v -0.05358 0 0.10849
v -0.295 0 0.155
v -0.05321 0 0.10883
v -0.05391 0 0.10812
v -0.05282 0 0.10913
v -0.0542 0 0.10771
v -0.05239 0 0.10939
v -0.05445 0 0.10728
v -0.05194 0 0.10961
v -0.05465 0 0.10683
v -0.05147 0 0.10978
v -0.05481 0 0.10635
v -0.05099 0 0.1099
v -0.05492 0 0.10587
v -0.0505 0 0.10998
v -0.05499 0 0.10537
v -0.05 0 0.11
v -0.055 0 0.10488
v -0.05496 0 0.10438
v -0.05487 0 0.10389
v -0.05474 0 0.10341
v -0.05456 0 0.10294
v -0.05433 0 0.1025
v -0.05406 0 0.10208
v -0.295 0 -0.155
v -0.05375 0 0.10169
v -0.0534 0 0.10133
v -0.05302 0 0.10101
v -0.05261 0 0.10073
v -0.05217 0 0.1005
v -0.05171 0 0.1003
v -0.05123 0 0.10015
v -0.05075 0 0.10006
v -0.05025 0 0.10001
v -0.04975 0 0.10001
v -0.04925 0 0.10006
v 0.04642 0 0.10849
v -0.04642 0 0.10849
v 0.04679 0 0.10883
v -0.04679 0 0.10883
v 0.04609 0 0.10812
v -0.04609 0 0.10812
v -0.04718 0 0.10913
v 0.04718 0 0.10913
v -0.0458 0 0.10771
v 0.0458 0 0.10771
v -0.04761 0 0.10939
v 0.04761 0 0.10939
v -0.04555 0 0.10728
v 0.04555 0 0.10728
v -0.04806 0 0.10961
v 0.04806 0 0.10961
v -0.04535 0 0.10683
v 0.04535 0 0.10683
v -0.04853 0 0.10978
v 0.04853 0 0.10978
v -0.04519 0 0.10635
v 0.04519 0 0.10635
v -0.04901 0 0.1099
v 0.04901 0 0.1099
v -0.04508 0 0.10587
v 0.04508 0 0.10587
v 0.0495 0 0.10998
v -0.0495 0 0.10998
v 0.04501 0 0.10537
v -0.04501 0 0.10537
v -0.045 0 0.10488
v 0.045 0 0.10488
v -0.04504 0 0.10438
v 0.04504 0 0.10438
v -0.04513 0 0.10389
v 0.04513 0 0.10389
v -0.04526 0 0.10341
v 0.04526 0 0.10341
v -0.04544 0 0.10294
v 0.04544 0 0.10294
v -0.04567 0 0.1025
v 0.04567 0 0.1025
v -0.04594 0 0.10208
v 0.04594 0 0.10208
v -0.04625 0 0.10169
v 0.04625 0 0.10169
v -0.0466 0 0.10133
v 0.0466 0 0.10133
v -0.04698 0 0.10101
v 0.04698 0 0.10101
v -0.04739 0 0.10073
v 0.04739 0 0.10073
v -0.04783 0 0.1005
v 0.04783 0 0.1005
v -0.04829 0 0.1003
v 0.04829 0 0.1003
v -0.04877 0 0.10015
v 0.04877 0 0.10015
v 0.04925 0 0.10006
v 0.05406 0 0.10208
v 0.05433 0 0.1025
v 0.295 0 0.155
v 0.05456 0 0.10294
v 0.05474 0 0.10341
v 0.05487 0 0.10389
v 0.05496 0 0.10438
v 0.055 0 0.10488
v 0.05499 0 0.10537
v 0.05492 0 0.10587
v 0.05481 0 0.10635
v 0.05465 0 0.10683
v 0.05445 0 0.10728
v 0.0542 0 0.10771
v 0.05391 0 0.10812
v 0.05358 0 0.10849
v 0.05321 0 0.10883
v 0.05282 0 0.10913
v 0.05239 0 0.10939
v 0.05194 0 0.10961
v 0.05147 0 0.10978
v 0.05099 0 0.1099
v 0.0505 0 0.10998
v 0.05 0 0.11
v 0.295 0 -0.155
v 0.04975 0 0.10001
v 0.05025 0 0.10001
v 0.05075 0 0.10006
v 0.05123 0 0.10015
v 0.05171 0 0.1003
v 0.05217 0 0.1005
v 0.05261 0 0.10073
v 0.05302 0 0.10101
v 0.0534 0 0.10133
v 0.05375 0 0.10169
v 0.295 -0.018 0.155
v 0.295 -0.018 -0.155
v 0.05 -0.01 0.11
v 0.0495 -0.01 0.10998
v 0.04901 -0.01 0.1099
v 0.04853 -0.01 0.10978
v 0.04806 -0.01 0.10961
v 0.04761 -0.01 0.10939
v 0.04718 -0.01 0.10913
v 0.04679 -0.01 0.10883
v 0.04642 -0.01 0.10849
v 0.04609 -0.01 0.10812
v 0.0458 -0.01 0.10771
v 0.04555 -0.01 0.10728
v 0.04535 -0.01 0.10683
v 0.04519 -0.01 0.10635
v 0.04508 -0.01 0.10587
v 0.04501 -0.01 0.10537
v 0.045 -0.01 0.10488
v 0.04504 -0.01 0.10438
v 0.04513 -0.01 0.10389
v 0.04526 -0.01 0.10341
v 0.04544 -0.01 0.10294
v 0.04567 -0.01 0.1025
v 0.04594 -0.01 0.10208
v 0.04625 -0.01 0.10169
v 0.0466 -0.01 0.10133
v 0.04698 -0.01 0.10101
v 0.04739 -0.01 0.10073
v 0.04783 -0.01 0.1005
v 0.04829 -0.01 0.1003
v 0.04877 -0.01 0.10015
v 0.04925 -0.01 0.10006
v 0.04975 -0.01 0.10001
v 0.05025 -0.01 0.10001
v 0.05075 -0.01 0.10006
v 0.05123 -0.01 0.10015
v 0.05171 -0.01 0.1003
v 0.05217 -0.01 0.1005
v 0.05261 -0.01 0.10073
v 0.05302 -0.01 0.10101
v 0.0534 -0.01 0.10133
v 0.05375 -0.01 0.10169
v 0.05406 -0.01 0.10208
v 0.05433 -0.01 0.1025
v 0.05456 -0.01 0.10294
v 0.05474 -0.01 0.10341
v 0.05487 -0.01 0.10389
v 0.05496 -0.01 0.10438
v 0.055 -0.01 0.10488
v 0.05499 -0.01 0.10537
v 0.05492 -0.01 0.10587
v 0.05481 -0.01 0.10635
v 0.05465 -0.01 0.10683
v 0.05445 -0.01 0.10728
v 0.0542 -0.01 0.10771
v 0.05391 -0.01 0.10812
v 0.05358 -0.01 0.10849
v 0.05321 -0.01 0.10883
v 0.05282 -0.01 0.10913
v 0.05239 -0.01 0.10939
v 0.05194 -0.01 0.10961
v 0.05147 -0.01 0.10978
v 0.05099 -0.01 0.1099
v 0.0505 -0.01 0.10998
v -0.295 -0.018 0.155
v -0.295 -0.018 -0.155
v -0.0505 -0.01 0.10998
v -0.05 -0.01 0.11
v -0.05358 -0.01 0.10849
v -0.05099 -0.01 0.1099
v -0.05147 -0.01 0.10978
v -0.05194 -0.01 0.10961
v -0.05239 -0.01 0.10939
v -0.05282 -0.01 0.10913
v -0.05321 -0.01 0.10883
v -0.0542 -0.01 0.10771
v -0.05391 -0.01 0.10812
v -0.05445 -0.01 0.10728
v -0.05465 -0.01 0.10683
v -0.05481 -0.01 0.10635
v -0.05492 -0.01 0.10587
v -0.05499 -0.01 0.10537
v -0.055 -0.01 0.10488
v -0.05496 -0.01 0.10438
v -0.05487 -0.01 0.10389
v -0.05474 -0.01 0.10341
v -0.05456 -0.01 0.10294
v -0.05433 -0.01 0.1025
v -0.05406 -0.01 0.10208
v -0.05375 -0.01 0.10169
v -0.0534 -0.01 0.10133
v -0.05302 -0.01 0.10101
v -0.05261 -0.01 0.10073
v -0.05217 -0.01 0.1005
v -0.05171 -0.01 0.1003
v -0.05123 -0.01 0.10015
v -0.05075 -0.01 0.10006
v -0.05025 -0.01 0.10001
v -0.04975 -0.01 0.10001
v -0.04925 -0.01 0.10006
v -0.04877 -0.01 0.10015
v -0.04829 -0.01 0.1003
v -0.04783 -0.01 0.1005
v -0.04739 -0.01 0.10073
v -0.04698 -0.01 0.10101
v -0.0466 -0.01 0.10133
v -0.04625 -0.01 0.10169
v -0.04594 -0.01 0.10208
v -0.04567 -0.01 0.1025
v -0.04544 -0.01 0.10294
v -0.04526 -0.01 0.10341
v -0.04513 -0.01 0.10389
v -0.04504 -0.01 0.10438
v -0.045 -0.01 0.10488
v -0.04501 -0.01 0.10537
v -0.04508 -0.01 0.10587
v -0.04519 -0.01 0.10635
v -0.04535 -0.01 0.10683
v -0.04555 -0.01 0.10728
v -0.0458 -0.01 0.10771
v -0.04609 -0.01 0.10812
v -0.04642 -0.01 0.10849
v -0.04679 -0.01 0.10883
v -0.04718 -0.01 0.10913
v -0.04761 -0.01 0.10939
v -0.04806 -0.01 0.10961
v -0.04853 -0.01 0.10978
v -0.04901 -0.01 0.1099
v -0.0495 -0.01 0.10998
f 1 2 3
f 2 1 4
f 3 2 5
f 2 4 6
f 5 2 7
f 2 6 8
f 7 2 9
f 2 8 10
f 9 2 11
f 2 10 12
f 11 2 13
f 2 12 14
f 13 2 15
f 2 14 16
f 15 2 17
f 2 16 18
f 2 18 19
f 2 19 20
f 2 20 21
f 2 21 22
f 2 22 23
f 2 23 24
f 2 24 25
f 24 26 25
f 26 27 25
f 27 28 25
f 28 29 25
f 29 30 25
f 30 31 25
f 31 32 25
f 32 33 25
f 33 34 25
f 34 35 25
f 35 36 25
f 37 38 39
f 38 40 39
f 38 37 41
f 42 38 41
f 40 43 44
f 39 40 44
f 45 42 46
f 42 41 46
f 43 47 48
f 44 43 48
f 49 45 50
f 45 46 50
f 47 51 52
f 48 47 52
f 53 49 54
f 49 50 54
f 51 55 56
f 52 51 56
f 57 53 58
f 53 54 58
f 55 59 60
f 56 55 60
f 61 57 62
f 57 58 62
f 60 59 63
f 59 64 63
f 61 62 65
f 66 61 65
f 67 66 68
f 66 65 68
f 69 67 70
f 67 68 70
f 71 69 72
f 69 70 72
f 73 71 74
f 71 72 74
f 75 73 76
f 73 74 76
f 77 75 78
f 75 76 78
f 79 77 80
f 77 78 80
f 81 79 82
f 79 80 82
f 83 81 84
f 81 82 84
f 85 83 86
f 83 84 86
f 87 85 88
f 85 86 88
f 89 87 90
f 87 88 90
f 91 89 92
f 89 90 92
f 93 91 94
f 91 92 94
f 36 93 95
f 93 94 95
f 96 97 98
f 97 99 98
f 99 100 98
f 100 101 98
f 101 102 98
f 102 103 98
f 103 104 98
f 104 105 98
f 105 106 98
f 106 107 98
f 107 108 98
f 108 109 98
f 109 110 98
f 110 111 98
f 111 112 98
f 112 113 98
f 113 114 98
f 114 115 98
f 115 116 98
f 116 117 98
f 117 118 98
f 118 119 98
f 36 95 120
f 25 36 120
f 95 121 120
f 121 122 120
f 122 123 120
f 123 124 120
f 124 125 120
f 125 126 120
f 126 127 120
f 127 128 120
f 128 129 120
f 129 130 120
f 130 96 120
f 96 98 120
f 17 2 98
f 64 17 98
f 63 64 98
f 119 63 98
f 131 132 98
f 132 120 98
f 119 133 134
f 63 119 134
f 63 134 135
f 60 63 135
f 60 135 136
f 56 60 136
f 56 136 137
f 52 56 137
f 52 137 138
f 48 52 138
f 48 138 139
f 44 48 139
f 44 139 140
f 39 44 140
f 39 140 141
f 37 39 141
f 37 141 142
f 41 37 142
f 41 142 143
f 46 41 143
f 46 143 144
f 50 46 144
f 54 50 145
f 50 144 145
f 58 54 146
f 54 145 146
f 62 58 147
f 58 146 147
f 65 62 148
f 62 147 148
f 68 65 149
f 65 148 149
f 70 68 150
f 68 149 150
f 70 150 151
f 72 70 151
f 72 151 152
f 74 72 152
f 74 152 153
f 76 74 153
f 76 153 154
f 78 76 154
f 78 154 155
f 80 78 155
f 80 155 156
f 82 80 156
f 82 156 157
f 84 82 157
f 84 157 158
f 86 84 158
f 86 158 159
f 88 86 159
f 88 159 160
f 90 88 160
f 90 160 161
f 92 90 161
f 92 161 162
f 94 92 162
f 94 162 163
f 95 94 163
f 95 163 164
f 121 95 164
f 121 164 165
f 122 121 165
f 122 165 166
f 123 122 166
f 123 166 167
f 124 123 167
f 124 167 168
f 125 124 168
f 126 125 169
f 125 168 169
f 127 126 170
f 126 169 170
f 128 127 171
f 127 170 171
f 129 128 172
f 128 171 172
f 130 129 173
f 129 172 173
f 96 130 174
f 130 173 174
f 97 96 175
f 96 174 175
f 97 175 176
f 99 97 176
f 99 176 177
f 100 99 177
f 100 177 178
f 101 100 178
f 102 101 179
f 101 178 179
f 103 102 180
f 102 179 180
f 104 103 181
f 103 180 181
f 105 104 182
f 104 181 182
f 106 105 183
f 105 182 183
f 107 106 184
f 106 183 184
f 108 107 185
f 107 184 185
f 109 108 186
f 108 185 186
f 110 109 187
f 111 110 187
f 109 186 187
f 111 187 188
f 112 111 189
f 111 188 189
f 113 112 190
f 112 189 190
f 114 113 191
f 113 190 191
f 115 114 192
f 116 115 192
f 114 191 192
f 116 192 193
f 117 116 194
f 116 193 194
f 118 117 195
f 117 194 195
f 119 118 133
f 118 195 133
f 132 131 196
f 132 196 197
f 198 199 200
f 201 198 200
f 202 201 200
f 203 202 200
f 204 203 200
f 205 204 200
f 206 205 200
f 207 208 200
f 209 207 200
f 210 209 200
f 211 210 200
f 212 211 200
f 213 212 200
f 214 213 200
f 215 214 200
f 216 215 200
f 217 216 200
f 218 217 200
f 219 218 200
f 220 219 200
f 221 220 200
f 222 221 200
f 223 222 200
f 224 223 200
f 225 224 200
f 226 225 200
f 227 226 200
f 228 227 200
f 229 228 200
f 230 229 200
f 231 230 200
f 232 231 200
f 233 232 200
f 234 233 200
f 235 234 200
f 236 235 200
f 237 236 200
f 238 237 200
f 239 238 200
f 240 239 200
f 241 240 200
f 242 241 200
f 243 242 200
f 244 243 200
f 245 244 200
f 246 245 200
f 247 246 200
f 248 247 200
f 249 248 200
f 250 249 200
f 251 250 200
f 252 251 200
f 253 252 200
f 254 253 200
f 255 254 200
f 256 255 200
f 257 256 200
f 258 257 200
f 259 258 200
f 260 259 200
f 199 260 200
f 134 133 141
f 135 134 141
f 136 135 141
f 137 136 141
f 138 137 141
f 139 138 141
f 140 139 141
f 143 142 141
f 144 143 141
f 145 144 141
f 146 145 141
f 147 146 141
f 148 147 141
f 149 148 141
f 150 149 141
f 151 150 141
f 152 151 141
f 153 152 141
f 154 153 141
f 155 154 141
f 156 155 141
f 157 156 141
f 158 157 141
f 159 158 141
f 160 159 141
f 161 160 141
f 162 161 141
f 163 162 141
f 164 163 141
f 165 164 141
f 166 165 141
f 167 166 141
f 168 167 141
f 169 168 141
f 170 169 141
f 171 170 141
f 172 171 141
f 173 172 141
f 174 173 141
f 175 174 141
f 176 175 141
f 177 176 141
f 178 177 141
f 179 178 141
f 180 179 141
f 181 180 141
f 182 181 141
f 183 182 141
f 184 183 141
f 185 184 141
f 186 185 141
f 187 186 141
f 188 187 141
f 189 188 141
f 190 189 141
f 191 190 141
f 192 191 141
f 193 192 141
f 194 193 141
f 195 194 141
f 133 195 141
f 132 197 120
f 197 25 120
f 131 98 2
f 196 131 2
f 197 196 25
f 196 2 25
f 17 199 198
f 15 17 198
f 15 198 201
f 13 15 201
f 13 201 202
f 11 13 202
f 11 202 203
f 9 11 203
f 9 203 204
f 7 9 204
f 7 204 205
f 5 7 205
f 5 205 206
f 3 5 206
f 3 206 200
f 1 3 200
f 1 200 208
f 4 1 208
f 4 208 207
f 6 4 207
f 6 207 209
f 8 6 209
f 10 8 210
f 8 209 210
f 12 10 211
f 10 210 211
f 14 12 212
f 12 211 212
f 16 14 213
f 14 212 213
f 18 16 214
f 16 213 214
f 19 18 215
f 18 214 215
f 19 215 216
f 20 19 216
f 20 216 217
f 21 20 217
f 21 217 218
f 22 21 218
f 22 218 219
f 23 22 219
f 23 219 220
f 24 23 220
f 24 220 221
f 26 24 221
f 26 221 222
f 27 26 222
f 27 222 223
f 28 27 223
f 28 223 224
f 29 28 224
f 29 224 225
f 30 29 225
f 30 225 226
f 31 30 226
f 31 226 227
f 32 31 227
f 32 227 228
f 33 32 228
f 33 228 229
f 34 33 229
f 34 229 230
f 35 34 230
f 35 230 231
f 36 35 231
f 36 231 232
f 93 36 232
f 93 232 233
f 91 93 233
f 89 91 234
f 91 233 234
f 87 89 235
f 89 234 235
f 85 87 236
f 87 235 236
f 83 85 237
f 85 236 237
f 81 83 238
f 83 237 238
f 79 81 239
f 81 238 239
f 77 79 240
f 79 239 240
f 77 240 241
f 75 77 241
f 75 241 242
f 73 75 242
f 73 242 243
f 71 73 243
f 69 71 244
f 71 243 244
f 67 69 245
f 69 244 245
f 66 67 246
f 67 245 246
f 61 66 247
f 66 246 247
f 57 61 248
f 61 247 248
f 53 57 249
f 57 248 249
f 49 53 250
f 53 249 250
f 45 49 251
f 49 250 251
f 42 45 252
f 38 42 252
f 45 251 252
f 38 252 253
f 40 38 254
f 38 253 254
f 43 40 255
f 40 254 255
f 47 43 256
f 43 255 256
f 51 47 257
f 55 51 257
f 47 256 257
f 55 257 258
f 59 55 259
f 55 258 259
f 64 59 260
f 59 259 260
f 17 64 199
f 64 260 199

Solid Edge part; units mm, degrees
sketch "Sketch1" plane through (0, 0, 0) normal (0, -1, 0) x (1, 0, 0)
  line L0 (-0.295, -0.155) -> (0.295, -0.155)
  line L1 (0.295, -0.155) -> (0.295, 0.155)
  line L2 (0.295, 0.155) -> (-0.295, 0.155)
  line L3 (-0.295, 0.155) -> (-0.295, -0.155)
  dimension "D1" = 0.31
  dimension "D2" = 0.59
extrude "Protrusion1" add sketch "Sketch1" along normal blind 0.018
hole "Bohrung_1" at (-0.05, 0, 0.105) direction (0, -1, 0) diameter 0.01 depth 0.01
hole "Hole1" at (0.05, 0, 0.105) direction (0, -1, 0) diameter 0.01 depth 0.01
